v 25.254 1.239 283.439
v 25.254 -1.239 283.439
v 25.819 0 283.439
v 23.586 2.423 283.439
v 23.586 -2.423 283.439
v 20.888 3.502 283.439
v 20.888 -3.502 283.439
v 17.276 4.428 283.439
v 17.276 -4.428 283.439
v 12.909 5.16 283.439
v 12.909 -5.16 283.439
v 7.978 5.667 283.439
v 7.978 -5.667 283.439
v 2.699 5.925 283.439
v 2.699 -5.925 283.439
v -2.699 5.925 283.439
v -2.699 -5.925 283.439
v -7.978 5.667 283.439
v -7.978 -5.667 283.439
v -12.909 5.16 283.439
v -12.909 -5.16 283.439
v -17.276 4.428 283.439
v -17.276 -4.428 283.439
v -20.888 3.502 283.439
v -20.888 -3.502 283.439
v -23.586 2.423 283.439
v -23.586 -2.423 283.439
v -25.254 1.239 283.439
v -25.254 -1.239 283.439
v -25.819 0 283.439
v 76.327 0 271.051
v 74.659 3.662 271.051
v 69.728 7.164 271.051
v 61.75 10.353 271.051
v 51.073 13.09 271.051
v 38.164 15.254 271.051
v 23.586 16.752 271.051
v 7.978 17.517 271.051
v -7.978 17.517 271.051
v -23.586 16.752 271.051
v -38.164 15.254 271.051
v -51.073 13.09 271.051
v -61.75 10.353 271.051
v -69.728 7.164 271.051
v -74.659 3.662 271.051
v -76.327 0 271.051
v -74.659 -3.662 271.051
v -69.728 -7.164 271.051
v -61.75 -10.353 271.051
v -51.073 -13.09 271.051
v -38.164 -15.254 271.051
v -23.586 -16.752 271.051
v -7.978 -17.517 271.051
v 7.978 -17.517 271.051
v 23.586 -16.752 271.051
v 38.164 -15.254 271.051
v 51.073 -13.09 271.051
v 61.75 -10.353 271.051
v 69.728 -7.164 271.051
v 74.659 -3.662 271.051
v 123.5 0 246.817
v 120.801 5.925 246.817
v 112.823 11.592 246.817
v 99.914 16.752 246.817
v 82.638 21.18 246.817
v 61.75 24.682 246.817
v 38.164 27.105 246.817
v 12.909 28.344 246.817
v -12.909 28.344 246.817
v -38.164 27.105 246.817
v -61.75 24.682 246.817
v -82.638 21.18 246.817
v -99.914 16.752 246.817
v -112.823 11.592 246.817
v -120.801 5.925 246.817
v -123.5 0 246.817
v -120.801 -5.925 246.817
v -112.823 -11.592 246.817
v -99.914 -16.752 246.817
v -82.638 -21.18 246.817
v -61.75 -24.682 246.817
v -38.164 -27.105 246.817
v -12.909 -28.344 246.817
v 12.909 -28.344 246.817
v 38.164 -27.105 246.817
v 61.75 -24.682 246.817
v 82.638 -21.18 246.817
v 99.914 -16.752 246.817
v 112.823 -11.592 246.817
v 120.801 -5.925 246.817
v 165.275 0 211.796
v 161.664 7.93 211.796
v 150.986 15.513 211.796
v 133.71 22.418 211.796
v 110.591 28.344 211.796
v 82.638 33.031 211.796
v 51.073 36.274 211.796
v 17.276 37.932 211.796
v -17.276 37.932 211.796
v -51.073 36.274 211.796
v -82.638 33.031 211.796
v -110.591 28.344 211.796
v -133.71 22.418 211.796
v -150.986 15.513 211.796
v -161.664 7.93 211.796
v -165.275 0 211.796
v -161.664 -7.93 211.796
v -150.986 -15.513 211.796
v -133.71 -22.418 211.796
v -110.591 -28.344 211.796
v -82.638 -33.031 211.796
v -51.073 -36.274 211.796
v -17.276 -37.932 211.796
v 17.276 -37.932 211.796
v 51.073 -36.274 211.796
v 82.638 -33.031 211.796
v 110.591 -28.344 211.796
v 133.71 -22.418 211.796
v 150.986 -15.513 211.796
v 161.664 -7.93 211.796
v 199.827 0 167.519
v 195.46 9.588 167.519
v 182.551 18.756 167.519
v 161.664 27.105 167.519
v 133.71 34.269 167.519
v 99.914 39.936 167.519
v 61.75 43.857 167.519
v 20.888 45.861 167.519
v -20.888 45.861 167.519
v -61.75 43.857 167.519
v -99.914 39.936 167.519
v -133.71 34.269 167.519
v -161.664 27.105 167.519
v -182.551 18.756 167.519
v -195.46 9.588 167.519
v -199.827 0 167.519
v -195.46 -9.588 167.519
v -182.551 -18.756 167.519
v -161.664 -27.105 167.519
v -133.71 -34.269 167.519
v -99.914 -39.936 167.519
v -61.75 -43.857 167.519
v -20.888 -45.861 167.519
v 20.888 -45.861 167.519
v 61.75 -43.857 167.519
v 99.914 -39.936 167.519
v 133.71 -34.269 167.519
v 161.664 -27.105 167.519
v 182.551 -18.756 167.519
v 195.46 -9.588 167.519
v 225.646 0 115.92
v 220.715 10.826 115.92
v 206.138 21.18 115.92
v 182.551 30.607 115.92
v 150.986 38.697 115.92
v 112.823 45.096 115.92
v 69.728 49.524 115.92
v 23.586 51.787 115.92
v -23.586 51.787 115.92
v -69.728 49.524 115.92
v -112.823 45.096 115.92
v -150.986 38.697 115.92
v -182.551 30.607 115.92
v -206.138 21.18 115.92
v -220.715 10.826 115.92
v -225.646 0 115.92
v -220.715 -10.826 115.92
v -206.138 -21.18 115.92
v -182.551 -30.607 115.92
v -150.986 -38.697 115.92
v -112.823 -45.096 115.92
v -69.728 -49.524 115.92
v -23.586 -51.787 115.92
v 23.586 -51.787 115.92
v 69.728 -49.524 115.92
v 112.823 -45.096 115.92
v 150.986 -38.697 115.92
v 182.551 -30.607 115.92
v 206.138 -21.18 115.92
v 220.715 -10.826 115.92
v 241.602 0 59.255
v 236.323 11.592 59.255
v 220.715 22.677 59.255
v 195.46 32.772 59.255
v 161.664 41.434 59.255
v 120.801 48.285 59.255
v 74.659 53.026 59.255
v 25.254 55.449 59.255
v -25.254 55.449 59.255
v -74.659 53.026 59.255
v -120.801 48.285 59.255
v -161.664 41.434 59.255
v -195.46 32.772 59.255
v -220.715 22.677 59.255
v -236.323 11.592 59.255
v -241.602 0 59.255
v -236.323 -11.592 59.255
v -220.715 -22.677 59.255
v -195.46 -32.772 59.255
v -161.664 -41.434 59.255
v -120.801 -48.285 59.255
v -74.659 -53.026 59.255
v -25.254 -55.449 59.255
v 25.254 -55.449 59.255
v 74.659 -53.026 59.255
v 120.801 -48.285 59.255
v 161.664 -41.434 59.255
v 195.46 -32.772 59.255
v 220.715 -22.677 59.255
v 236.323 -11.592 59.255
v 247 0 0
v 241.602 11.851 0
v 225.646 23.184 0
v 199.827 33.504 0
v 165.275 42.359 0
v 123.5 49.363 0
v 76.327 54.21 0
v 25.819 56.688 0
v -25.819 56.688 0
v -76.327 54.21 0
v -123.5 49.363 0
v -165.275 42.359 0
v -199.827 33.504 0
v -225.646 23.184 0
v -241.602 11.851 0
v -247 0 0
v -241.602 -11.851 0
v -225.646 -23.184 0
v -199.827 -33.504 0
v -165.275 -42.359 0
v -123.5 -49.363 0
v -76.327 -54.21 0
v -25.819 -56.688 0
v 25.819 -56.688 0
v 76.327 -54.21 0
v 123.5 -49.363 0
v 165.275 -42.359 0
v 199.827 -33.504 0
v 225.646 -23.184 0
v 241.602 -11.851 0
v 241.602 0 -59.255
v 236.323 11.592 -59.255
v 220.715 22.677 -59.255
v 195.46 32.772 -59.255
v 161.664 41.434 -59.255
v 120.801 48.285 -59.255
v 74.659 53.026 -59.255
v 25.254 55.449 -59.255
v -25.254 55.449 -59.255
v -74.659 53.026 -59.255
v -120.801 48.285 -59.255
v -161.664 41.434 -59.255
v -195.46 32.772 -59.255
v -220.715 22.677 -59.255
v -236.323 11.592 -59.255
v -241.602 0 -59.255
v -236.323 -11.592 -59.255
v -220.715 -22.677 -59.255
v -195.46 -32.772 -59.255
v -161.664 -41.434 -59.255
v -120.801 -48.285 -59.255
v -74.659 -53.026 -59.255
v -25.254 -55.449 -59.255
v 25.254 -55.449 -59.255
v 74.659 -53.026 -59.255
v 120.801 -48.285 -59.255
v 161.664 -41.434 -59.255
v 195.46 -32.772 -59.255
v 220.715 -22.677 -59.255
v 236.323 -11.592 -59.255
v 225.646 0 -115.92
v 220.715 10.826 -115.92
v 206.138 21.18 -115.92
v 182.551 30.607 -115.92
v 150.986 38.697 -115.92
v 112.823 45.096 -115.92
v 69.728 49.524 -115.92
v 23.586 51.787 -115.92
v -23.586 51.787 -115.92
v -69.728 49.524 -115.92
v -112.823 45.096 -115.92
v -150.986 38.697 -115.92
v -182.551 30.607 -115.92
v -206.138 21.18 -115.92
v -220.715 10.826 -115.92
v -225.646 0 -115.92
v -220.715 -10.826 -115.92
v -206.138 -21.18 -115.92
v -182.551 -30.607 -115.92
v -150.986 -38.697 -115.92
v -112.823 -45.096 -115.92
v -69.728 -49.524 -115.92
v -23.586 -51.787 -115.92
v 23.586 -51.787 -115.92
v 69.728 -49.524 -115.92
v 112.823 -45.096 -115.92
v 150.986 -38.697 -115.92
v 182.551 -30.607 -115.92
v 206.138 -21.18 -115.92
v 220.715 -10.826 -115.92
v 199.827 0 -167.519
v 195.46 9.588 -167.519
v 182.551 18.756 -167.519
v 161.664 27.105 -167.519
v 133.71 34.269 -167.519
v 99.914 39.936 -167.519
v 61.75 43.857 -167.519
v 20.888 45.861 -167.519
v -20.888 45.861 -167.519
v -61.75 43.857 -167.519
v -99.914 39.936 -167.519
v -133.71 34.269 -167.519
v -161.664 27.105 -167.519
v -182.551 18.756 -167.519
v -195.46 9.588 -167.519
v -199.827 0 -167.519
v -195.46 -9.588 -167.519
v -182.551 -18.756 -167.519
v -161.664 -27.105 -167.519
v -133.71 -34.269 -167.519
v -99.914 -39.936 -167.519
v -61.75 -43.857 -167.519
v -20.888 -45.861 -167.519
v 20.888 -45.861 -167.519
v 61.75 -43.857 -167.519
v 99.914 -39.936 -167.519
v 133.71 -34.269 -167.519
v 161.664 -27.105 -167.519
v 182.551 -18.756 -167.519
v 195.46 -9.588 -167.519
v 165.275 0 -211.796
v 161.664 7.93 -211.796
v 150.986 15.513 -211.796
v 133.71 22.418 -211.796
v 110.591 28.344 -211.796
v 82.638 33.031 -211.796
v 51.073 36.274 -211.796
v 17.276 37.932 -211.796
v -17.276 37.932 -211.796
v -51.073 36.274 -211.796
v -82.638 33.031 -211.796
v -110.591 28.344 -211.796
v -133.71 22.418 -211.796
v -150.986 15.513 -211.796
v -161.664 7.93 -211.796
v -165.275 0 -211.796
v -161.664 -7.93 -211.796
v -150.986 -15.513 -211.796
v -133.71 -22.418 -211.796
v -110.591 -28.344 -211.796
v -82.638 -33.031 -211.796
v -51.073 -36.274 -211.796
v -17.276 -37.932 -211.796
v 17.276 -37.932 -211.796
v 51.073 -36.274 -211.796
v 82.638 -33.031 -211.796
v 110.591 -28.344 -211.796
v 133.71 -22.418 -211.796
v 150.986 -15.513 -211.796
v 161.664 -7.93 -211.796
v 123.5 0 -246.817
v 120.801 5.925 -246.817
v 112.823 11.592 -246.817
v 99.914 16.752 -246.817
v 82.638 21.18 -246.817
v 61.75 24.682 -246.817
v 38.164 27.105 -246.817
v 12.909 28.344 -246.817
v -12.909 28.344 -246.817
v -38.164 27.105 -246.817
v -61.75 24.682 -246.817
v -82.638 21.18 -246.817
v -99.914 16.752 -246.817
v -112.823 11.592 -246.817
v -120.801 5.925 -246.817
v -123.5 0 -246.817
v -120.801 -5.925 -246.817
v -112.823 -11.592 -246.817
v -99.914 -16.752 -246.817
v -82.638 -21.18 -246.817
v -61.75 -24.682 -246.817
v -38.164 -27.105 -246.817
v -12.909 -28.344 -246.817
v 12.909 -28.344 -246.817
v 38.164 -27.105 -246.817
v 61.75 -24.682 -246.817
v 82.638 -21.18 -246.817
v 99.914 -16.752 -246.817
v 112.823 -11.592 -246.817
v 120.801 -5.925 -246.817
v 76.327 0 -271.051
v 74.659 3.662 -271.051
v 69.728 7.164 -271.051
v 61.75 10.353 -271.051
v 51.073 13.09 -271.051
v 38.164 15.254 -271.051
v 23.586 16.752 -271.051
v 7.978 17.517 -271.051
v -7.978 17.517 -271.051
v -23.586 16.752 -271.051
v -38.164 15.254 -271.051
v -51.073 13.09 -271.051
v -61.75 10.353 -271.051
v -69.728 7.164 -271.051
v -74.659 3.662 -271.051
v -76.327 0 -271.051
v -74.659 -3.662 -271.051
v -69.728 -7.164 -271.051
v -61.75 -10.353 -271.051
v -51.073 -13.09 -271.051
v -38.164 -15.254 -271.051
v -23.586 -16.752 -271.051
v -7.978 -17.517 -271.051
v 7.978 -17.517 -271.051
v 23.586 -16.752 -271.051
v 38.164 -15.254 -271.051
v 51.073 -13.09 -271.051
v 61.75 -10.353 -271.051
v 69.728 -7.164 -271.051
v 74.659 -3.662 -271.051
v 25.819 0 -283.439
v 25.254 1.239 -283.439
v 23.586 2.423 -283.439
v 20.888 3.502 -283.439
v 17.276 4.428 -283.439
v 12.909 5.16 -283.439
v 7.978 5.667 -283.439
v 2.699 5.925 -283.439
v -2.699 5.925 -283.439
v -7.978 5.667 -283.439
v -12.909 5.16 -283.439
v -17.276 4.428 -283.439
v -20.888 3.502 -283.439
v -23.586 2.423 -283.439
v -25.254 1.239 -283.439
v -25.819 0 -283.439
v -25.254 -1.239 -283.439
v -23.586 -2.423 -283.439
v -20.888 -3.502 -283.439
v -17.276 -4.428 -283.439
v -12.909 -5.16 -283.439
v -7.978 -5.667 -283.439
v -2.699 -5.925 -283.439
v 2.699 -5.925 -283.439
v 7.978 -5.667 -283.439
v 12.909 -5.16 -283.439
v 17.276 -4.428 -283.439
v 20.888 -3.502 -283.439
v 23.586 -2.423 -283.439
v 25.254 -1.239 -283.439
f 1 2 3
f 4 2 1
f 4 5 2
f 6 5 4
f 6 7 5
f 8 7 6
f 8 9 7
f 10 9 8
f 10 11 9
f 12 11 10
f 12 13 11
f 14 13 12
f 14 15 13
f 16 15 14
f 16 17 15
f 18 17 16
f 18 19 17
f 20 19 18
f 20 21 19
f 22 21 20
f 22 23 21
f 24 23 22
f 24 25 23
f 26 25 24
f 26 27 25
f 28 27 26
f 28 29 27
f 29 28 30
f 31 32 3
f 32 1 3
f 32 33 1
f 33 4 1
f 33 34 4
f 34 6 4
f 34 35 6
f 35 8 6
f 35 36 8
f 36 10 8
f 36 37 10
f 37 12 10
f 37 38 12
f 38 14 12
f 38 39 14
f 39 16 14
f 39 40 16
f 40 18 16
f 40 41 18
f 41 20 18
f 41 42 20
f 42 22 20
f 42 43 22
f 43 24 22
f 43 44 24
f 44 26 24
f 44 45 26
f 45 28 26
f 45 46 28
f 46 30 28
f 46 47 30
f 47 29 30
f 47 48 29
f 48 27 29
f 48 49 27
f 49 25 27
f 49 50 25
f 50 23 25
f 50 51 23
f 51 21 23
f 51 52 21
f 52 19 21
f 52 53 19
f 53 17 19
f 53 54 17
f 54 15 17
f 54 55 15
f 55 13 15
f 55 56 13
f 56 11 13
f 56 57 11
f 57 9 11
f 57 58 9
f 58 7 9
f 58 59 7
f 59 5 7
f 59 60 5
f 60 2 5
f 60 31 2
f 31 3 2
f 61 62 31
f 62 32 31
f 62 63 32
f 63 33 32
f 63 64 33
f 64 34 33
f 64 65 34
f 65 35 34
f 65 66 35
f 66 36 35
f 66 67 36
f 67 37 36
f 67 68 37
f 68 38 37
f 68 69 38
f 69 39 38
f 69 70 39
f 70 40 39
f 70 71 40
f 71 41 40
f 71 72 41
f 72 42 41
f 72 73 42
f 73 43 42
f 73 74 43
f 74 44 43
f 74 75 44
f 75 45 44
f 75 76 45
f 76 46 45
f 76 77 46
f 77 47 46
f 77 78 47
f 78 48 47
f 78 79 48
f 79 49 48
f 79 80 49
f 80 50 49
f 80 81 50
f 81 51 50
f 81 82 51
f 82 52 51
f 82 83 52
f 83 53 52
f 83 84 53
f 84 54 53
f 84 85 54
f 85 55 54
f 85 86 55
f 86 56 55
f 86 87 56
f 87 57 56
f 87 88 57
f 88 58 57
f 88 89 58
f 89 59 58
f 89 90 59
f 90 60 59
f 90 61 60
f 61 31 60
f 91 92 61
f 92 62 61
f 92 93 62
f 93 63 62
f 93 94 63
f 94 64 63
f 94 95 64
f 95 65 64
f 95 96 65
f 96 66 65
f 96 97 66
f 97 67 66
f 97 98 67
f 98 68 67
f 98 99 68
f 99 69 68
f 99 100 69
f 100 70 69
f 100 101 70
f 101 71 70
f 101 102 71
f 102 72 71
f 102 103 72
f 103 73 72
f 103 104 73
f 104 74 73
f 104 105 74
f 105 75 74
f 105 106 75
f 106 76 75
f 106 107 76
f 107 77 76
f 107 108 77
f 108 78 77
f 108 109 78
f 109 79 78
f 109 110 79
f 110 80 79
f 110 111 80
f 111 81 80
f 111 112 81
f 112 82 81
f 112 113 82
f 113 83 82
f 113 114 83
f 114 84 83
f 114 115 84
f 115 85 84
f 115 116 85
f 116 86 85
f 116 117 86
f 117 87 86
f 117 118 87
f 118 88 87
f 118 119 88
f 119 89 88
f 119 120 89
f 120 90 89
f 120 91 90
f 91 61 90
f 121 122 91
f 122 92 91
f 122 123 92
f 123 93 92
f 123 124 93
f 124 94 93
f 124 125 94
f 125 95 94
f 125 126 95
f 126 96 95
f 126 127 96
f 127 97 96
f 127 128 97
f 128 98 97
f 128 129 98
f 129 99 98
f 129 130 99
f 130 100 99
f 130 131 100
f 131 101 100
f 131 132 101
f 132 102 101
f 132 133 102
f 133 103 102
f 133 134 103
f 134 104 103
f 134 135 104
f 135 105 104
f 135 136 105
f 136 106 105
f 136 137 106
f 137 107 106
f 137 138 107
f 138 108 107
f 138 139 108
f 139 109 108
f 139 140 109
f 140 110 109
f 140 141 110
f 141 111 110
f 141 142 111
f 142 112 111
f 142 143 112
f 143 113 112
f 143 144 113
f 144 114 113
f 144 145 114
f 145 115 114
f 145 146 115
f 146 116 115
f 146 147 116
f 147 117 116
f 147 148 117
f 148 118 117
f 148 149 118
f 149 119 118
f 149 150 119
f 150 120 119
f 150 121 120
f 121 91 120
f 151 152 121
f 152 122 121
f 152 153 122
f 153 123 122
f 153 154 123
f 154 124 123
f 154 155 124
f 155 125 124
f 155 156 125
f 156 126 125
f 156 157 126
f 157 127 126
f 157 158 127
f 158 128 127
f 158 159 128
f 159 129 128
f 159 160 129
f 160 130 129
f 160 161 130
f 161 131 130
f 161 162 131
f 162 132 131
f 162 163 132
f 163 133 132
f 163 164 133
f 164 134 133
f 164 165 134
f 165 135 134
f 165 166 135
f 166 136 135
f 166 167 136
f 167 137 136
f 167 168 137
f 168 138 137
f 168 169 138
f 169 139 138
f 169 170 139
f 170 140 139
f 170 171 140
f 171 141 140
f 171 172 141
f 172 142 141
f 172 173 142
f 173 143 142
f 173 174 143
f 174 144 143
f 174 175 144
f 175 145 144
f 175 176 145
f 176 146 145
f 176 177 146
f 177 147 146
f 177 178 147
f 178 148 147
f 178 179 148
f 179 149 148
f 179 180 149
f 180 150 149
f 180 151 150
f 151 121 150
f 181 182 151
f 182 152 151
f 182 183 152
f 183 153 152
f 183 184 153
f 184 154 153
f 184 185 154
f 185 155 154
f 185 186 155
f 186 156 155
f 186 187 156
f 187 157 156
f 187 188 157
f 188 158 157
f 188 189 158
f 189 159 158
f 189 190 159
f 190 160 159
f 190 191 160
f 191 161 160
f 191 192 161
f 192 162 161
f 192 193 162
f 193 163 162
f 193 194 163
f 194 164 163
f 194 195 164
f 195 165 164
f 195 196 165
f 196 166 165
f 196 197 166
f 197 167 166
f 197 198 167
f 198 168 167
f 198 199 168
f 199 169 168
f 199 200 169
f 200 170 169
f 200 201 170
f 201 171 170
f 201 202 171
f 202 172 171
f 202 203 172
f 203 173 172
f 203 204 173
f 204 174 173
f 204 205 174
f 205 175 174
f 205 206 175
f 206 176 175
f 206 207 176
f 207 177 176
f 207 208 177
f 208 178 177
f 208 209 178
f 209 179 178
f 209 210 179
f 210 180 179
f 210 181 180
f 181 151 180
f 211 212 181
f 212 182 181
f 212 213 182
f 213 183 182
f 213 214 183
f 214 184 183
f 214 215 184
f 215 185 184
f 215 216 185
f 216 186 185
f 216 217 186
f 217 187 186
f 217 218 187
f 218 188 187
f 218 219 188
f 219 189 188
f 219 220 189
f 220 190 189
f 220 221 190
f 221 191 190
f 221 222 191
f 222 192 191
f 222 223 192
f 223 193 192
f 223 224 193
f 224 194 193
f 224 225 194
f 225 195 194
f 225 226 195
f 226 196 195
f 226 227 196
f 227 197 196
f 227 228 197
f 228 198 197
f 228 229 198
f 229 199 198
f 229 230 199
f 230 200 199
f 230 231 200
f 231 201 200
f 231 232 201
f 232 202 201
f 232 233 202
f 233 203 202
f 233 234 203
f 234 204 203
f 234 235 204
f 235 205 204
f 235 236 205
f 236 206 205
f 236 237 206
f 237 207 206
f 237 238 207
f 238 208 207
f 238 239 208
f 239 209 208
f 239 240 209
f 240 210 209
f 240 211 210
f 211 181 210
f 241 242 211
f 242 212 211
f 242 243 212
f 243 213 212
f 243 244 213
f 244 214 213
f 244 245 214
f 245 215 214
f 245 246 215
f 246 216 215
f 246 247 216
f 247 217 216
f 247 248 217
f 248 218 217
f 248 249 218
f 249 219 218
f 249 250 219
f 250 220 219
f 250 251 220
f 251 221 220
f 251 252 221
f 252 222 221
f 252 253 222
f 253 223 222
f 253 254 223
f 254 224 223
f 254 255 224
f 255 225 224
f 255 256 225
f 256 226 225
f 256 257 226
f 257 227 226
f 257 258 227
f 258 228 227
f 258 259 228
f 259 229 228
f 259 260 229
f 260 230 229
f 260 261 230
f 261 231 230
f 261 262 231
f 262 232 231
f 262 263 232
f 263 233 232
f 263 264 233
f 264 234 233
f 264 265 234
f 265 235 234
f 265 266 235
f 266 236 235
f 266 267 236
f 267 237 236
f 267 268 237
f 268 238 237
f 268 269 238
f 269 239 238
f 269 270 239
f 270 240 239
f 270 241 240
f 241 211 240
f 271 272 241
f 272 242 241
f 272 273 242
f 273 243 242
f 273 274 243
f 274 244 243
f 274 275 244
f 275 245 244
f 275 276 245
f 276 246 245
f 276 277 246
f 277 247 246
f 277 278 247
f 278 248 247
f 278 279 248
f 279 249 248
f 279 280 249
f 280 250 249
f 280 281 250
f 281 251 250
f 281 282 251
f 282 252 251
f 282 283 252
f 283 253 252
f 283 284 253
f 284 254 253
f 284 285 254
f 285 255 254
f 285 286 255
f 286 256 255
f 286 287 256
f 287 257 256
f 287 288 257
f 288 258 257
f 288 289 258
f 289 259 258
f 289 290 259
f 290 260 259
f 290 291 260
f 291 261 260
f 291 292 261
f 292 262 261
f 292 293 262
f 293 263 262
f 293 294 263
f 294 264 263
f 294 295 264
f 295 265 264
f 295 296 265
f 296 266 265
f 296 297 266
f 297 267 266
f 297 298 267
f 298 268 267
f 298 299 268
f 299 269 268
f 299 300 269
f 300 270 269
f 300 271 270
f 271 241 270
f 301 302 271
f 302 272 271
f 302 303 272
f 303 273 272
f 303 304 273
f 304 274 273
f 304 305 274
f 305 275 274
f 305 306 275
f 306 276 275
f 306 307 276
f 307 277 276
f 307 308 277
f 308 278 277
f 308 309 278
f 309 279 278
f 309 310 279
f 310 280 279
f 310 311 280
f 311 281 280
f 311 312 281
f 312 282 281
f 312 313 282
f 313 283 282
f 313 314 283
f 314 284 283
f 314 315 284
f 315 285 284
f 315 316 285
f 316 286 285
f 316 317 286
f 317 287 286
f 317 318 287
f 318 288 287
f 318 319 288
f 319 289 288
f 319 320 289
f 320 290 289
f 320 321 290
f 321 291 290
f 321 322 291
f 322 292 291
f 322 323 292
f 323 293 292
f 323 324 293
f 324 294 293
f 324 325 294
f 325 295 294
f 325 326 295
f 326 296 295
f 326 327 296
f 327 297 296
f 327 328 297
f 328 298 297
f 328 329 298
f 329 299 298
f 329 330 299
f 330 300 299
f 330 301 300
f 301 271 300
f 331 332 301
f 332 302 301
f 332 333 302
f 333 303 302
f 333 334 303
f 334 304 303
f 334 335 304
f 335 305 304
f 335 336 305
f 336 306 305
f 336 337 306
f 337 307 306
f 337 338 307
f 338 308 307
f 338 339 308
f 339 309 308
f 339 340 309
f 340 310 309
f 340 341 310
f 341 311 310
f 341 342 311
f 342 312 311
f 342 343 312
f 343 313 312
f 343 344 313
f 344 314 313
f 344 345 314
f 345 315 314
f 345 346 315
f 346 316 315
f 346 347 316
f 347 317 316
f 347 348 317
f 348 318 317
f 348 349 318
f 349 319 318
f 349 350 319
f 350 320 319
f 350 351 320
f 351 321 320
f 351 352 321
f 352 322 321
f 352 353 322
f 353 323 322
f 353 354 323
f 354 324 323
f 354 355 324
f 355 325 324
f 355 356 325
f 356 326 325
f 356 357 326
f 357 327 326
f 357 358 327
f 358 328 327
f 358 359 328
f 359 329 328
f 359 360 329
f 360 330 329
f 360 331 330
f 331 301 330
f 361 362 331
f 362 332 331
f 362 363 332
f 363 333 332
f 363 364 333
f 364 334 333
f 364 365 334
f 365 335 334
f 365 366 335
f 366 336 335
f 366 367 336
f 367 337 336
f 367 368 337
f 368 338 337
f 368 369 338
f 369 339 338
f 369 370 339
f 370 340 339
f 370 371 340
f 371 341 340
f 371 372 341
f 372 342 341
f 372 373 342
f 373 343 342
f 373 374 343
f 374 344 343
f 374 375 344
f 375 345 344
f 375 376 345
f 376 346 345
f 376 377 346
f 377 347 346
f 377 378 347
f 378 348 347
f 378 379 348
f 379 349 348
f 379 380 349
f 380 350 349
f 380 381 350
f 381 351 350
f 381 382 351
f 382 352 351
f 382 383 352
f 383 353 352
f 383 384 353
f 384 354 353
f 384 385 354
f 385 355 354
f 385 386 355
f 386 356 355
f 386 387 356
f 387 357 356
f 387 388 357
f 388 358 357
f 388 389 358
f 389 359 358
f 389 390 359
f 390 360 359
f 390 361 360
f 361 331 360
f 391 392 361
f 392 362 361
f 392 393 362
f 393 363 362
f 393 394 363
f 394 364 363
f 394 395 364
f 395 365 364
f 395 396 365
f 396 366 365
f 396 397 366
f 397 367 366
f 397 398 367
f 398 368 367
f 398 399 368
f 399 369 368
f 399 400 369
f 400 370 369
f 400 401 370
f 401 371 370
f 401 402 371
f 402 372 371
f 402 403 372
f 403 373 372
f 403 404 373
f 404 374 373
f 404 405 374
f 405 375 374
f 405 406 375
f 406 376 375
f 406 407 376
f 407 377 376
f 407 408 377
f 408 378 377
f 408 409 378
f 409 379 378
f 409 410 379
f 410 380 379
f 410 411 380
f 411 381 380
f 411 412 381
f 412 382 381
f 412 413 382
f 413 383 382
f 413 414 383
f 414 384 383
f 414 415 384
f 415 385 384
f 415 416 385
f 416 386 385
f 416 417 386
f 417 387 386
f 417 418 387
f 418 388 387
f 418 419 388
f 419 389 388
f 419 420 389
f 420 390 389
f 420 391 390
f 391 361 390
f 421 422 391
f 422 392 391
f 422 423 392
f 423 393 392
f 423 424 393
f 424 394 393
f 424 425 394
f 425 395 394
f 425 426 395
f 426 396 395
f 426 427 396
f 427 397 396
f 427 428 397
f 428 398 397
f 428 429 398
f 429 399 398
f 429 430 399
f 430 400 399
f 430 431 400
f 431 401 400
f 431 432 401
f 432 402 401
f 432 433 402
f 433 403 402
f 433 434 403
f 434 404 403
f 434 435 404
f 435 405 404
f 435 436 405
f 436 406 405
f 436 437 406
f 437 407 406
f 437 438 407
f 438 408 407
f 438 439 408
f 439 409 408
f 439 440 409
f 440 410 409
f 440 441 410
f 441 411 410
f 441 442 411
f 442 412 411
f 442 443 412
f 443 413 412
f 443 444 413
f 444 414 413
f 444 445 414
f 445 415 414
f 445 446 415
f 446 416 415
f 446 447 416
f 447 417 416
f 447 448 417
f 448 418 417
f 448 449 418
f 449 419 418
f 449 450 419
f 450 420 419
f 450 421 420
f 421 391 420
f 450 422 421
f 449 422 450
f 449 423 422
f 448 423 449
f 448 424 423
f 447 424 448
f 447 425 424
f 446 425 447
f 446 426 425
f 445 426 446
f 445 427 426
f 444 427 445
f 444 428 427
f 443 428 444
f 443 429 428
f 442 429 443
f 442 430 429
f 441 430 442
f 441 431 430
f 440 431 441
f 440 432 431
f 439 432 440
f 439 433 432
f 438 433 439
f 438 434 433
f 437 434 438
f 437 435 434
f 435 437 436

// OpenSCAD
// Generated by SolidPython 1.0.1 on 2020-07-29 00:46:50


scale(v = [13, 3, 15]) {
	sphere(r = 19);
}
/***********************************************
*********      SolidPython code:      **********
************************************************
 
# import packages: SolidPython
from solid import *
from solid.utils import *
from itertools import chain, combinations, permutations


class Resize:

    def __init__(self, scad_file):
        self.scad_file = scad_file
        #self.scad_file = import_scad(scad_file)
        # cone/cylinder param:
        self.r1 = 0
        self.r2 = 0
        self.h = 0
        # rectangular prism param:
        self.w = 0
        self.l = 0
        # ellipse param:
        self.r = 0

    # import OpenScad code (file name corresponds to shape)


    # classify shape + parameters
    def assign(self, param1, param2, param3):
        if self.scad_file == 'cone.scad':
            self.r1 = param1
            self.r2 = param2
            self.h = param3
        elif self.scad_file == 'cylinder.scad':
            self.r1 = param1
            self.r2 = param2
            self.h = param3
        elif self.scad_file == 'rectangularPrism.scad':
            self.h = param1
            self.l = param2
            self.w = param3
        else:
            self.r = param1
            self.h = param2

    # resize parameters
    def iterate(self):
        x = range(3, 20, 2)
        i = 1
        if self.scad_file == 'cone.scad':
            tempList = list(permutations(x, 2))
            for temp in tempList:
                param1 = temp[0]
                param2 = temp[1]
                filepath = 'produced_scad_files/' + 'cone' + str(param1) + '_' + str(param2) + '_' + '.scad'
                scad_render_to_file(cylinder(h=param1, r1=param2, r2=0), filepath)

        elif self.scad_file == 'cylinder.scad':
            tempList = list(permutations(x, 3))
            for temp in tempList:
                param1 = temp[0]
                param2 = temp[1]
                filepath = 'produced_scad_files/' + 'cylinder' + str(param1) + '_' + str(param2) + '_' + '.scad'
                scad_render_to_file(cylinder(h=param1, r1=param2, r2=param2), filepath)

        elif self.scad_file == 'rectangularPrism.scad':
            tempList = list(permutations(x, 3))
            for temp in tempList:
                param1 = temp[0]
                param2 = temp[1]
                param3 = temp[2]
                filepath = 'produced_scad_files/' + 'rectangularPrism' + str(param1) + '_' + str(param2) + '_' + str(
                    param3) + '.scad'
                scad_render_to_file(cube(size=(param1, param2, param3)), filepath)

        elif self.scad_file == 'ellipse.scad':
            tempList = list(permutations(x, 4))
            for temp in tempList:
                param1 = temp[0]
                param2 = temp[1]
                param3 = temp[2]
                param4 = temp[3]
                filepath = 'produced_scad_files/' + 'ellipse' + str(param1) + '_' + str(param2) + '_' + str(param3) + '_' + str(param4) + '.scad'
                scad_render_to_file(scale([param1, param2, param3])(sphere(r=param4)), filepath)

    def render_to_scadfile(self):
        scad_render_to_file(scad, 'example.scad') 
 
************************************************/
